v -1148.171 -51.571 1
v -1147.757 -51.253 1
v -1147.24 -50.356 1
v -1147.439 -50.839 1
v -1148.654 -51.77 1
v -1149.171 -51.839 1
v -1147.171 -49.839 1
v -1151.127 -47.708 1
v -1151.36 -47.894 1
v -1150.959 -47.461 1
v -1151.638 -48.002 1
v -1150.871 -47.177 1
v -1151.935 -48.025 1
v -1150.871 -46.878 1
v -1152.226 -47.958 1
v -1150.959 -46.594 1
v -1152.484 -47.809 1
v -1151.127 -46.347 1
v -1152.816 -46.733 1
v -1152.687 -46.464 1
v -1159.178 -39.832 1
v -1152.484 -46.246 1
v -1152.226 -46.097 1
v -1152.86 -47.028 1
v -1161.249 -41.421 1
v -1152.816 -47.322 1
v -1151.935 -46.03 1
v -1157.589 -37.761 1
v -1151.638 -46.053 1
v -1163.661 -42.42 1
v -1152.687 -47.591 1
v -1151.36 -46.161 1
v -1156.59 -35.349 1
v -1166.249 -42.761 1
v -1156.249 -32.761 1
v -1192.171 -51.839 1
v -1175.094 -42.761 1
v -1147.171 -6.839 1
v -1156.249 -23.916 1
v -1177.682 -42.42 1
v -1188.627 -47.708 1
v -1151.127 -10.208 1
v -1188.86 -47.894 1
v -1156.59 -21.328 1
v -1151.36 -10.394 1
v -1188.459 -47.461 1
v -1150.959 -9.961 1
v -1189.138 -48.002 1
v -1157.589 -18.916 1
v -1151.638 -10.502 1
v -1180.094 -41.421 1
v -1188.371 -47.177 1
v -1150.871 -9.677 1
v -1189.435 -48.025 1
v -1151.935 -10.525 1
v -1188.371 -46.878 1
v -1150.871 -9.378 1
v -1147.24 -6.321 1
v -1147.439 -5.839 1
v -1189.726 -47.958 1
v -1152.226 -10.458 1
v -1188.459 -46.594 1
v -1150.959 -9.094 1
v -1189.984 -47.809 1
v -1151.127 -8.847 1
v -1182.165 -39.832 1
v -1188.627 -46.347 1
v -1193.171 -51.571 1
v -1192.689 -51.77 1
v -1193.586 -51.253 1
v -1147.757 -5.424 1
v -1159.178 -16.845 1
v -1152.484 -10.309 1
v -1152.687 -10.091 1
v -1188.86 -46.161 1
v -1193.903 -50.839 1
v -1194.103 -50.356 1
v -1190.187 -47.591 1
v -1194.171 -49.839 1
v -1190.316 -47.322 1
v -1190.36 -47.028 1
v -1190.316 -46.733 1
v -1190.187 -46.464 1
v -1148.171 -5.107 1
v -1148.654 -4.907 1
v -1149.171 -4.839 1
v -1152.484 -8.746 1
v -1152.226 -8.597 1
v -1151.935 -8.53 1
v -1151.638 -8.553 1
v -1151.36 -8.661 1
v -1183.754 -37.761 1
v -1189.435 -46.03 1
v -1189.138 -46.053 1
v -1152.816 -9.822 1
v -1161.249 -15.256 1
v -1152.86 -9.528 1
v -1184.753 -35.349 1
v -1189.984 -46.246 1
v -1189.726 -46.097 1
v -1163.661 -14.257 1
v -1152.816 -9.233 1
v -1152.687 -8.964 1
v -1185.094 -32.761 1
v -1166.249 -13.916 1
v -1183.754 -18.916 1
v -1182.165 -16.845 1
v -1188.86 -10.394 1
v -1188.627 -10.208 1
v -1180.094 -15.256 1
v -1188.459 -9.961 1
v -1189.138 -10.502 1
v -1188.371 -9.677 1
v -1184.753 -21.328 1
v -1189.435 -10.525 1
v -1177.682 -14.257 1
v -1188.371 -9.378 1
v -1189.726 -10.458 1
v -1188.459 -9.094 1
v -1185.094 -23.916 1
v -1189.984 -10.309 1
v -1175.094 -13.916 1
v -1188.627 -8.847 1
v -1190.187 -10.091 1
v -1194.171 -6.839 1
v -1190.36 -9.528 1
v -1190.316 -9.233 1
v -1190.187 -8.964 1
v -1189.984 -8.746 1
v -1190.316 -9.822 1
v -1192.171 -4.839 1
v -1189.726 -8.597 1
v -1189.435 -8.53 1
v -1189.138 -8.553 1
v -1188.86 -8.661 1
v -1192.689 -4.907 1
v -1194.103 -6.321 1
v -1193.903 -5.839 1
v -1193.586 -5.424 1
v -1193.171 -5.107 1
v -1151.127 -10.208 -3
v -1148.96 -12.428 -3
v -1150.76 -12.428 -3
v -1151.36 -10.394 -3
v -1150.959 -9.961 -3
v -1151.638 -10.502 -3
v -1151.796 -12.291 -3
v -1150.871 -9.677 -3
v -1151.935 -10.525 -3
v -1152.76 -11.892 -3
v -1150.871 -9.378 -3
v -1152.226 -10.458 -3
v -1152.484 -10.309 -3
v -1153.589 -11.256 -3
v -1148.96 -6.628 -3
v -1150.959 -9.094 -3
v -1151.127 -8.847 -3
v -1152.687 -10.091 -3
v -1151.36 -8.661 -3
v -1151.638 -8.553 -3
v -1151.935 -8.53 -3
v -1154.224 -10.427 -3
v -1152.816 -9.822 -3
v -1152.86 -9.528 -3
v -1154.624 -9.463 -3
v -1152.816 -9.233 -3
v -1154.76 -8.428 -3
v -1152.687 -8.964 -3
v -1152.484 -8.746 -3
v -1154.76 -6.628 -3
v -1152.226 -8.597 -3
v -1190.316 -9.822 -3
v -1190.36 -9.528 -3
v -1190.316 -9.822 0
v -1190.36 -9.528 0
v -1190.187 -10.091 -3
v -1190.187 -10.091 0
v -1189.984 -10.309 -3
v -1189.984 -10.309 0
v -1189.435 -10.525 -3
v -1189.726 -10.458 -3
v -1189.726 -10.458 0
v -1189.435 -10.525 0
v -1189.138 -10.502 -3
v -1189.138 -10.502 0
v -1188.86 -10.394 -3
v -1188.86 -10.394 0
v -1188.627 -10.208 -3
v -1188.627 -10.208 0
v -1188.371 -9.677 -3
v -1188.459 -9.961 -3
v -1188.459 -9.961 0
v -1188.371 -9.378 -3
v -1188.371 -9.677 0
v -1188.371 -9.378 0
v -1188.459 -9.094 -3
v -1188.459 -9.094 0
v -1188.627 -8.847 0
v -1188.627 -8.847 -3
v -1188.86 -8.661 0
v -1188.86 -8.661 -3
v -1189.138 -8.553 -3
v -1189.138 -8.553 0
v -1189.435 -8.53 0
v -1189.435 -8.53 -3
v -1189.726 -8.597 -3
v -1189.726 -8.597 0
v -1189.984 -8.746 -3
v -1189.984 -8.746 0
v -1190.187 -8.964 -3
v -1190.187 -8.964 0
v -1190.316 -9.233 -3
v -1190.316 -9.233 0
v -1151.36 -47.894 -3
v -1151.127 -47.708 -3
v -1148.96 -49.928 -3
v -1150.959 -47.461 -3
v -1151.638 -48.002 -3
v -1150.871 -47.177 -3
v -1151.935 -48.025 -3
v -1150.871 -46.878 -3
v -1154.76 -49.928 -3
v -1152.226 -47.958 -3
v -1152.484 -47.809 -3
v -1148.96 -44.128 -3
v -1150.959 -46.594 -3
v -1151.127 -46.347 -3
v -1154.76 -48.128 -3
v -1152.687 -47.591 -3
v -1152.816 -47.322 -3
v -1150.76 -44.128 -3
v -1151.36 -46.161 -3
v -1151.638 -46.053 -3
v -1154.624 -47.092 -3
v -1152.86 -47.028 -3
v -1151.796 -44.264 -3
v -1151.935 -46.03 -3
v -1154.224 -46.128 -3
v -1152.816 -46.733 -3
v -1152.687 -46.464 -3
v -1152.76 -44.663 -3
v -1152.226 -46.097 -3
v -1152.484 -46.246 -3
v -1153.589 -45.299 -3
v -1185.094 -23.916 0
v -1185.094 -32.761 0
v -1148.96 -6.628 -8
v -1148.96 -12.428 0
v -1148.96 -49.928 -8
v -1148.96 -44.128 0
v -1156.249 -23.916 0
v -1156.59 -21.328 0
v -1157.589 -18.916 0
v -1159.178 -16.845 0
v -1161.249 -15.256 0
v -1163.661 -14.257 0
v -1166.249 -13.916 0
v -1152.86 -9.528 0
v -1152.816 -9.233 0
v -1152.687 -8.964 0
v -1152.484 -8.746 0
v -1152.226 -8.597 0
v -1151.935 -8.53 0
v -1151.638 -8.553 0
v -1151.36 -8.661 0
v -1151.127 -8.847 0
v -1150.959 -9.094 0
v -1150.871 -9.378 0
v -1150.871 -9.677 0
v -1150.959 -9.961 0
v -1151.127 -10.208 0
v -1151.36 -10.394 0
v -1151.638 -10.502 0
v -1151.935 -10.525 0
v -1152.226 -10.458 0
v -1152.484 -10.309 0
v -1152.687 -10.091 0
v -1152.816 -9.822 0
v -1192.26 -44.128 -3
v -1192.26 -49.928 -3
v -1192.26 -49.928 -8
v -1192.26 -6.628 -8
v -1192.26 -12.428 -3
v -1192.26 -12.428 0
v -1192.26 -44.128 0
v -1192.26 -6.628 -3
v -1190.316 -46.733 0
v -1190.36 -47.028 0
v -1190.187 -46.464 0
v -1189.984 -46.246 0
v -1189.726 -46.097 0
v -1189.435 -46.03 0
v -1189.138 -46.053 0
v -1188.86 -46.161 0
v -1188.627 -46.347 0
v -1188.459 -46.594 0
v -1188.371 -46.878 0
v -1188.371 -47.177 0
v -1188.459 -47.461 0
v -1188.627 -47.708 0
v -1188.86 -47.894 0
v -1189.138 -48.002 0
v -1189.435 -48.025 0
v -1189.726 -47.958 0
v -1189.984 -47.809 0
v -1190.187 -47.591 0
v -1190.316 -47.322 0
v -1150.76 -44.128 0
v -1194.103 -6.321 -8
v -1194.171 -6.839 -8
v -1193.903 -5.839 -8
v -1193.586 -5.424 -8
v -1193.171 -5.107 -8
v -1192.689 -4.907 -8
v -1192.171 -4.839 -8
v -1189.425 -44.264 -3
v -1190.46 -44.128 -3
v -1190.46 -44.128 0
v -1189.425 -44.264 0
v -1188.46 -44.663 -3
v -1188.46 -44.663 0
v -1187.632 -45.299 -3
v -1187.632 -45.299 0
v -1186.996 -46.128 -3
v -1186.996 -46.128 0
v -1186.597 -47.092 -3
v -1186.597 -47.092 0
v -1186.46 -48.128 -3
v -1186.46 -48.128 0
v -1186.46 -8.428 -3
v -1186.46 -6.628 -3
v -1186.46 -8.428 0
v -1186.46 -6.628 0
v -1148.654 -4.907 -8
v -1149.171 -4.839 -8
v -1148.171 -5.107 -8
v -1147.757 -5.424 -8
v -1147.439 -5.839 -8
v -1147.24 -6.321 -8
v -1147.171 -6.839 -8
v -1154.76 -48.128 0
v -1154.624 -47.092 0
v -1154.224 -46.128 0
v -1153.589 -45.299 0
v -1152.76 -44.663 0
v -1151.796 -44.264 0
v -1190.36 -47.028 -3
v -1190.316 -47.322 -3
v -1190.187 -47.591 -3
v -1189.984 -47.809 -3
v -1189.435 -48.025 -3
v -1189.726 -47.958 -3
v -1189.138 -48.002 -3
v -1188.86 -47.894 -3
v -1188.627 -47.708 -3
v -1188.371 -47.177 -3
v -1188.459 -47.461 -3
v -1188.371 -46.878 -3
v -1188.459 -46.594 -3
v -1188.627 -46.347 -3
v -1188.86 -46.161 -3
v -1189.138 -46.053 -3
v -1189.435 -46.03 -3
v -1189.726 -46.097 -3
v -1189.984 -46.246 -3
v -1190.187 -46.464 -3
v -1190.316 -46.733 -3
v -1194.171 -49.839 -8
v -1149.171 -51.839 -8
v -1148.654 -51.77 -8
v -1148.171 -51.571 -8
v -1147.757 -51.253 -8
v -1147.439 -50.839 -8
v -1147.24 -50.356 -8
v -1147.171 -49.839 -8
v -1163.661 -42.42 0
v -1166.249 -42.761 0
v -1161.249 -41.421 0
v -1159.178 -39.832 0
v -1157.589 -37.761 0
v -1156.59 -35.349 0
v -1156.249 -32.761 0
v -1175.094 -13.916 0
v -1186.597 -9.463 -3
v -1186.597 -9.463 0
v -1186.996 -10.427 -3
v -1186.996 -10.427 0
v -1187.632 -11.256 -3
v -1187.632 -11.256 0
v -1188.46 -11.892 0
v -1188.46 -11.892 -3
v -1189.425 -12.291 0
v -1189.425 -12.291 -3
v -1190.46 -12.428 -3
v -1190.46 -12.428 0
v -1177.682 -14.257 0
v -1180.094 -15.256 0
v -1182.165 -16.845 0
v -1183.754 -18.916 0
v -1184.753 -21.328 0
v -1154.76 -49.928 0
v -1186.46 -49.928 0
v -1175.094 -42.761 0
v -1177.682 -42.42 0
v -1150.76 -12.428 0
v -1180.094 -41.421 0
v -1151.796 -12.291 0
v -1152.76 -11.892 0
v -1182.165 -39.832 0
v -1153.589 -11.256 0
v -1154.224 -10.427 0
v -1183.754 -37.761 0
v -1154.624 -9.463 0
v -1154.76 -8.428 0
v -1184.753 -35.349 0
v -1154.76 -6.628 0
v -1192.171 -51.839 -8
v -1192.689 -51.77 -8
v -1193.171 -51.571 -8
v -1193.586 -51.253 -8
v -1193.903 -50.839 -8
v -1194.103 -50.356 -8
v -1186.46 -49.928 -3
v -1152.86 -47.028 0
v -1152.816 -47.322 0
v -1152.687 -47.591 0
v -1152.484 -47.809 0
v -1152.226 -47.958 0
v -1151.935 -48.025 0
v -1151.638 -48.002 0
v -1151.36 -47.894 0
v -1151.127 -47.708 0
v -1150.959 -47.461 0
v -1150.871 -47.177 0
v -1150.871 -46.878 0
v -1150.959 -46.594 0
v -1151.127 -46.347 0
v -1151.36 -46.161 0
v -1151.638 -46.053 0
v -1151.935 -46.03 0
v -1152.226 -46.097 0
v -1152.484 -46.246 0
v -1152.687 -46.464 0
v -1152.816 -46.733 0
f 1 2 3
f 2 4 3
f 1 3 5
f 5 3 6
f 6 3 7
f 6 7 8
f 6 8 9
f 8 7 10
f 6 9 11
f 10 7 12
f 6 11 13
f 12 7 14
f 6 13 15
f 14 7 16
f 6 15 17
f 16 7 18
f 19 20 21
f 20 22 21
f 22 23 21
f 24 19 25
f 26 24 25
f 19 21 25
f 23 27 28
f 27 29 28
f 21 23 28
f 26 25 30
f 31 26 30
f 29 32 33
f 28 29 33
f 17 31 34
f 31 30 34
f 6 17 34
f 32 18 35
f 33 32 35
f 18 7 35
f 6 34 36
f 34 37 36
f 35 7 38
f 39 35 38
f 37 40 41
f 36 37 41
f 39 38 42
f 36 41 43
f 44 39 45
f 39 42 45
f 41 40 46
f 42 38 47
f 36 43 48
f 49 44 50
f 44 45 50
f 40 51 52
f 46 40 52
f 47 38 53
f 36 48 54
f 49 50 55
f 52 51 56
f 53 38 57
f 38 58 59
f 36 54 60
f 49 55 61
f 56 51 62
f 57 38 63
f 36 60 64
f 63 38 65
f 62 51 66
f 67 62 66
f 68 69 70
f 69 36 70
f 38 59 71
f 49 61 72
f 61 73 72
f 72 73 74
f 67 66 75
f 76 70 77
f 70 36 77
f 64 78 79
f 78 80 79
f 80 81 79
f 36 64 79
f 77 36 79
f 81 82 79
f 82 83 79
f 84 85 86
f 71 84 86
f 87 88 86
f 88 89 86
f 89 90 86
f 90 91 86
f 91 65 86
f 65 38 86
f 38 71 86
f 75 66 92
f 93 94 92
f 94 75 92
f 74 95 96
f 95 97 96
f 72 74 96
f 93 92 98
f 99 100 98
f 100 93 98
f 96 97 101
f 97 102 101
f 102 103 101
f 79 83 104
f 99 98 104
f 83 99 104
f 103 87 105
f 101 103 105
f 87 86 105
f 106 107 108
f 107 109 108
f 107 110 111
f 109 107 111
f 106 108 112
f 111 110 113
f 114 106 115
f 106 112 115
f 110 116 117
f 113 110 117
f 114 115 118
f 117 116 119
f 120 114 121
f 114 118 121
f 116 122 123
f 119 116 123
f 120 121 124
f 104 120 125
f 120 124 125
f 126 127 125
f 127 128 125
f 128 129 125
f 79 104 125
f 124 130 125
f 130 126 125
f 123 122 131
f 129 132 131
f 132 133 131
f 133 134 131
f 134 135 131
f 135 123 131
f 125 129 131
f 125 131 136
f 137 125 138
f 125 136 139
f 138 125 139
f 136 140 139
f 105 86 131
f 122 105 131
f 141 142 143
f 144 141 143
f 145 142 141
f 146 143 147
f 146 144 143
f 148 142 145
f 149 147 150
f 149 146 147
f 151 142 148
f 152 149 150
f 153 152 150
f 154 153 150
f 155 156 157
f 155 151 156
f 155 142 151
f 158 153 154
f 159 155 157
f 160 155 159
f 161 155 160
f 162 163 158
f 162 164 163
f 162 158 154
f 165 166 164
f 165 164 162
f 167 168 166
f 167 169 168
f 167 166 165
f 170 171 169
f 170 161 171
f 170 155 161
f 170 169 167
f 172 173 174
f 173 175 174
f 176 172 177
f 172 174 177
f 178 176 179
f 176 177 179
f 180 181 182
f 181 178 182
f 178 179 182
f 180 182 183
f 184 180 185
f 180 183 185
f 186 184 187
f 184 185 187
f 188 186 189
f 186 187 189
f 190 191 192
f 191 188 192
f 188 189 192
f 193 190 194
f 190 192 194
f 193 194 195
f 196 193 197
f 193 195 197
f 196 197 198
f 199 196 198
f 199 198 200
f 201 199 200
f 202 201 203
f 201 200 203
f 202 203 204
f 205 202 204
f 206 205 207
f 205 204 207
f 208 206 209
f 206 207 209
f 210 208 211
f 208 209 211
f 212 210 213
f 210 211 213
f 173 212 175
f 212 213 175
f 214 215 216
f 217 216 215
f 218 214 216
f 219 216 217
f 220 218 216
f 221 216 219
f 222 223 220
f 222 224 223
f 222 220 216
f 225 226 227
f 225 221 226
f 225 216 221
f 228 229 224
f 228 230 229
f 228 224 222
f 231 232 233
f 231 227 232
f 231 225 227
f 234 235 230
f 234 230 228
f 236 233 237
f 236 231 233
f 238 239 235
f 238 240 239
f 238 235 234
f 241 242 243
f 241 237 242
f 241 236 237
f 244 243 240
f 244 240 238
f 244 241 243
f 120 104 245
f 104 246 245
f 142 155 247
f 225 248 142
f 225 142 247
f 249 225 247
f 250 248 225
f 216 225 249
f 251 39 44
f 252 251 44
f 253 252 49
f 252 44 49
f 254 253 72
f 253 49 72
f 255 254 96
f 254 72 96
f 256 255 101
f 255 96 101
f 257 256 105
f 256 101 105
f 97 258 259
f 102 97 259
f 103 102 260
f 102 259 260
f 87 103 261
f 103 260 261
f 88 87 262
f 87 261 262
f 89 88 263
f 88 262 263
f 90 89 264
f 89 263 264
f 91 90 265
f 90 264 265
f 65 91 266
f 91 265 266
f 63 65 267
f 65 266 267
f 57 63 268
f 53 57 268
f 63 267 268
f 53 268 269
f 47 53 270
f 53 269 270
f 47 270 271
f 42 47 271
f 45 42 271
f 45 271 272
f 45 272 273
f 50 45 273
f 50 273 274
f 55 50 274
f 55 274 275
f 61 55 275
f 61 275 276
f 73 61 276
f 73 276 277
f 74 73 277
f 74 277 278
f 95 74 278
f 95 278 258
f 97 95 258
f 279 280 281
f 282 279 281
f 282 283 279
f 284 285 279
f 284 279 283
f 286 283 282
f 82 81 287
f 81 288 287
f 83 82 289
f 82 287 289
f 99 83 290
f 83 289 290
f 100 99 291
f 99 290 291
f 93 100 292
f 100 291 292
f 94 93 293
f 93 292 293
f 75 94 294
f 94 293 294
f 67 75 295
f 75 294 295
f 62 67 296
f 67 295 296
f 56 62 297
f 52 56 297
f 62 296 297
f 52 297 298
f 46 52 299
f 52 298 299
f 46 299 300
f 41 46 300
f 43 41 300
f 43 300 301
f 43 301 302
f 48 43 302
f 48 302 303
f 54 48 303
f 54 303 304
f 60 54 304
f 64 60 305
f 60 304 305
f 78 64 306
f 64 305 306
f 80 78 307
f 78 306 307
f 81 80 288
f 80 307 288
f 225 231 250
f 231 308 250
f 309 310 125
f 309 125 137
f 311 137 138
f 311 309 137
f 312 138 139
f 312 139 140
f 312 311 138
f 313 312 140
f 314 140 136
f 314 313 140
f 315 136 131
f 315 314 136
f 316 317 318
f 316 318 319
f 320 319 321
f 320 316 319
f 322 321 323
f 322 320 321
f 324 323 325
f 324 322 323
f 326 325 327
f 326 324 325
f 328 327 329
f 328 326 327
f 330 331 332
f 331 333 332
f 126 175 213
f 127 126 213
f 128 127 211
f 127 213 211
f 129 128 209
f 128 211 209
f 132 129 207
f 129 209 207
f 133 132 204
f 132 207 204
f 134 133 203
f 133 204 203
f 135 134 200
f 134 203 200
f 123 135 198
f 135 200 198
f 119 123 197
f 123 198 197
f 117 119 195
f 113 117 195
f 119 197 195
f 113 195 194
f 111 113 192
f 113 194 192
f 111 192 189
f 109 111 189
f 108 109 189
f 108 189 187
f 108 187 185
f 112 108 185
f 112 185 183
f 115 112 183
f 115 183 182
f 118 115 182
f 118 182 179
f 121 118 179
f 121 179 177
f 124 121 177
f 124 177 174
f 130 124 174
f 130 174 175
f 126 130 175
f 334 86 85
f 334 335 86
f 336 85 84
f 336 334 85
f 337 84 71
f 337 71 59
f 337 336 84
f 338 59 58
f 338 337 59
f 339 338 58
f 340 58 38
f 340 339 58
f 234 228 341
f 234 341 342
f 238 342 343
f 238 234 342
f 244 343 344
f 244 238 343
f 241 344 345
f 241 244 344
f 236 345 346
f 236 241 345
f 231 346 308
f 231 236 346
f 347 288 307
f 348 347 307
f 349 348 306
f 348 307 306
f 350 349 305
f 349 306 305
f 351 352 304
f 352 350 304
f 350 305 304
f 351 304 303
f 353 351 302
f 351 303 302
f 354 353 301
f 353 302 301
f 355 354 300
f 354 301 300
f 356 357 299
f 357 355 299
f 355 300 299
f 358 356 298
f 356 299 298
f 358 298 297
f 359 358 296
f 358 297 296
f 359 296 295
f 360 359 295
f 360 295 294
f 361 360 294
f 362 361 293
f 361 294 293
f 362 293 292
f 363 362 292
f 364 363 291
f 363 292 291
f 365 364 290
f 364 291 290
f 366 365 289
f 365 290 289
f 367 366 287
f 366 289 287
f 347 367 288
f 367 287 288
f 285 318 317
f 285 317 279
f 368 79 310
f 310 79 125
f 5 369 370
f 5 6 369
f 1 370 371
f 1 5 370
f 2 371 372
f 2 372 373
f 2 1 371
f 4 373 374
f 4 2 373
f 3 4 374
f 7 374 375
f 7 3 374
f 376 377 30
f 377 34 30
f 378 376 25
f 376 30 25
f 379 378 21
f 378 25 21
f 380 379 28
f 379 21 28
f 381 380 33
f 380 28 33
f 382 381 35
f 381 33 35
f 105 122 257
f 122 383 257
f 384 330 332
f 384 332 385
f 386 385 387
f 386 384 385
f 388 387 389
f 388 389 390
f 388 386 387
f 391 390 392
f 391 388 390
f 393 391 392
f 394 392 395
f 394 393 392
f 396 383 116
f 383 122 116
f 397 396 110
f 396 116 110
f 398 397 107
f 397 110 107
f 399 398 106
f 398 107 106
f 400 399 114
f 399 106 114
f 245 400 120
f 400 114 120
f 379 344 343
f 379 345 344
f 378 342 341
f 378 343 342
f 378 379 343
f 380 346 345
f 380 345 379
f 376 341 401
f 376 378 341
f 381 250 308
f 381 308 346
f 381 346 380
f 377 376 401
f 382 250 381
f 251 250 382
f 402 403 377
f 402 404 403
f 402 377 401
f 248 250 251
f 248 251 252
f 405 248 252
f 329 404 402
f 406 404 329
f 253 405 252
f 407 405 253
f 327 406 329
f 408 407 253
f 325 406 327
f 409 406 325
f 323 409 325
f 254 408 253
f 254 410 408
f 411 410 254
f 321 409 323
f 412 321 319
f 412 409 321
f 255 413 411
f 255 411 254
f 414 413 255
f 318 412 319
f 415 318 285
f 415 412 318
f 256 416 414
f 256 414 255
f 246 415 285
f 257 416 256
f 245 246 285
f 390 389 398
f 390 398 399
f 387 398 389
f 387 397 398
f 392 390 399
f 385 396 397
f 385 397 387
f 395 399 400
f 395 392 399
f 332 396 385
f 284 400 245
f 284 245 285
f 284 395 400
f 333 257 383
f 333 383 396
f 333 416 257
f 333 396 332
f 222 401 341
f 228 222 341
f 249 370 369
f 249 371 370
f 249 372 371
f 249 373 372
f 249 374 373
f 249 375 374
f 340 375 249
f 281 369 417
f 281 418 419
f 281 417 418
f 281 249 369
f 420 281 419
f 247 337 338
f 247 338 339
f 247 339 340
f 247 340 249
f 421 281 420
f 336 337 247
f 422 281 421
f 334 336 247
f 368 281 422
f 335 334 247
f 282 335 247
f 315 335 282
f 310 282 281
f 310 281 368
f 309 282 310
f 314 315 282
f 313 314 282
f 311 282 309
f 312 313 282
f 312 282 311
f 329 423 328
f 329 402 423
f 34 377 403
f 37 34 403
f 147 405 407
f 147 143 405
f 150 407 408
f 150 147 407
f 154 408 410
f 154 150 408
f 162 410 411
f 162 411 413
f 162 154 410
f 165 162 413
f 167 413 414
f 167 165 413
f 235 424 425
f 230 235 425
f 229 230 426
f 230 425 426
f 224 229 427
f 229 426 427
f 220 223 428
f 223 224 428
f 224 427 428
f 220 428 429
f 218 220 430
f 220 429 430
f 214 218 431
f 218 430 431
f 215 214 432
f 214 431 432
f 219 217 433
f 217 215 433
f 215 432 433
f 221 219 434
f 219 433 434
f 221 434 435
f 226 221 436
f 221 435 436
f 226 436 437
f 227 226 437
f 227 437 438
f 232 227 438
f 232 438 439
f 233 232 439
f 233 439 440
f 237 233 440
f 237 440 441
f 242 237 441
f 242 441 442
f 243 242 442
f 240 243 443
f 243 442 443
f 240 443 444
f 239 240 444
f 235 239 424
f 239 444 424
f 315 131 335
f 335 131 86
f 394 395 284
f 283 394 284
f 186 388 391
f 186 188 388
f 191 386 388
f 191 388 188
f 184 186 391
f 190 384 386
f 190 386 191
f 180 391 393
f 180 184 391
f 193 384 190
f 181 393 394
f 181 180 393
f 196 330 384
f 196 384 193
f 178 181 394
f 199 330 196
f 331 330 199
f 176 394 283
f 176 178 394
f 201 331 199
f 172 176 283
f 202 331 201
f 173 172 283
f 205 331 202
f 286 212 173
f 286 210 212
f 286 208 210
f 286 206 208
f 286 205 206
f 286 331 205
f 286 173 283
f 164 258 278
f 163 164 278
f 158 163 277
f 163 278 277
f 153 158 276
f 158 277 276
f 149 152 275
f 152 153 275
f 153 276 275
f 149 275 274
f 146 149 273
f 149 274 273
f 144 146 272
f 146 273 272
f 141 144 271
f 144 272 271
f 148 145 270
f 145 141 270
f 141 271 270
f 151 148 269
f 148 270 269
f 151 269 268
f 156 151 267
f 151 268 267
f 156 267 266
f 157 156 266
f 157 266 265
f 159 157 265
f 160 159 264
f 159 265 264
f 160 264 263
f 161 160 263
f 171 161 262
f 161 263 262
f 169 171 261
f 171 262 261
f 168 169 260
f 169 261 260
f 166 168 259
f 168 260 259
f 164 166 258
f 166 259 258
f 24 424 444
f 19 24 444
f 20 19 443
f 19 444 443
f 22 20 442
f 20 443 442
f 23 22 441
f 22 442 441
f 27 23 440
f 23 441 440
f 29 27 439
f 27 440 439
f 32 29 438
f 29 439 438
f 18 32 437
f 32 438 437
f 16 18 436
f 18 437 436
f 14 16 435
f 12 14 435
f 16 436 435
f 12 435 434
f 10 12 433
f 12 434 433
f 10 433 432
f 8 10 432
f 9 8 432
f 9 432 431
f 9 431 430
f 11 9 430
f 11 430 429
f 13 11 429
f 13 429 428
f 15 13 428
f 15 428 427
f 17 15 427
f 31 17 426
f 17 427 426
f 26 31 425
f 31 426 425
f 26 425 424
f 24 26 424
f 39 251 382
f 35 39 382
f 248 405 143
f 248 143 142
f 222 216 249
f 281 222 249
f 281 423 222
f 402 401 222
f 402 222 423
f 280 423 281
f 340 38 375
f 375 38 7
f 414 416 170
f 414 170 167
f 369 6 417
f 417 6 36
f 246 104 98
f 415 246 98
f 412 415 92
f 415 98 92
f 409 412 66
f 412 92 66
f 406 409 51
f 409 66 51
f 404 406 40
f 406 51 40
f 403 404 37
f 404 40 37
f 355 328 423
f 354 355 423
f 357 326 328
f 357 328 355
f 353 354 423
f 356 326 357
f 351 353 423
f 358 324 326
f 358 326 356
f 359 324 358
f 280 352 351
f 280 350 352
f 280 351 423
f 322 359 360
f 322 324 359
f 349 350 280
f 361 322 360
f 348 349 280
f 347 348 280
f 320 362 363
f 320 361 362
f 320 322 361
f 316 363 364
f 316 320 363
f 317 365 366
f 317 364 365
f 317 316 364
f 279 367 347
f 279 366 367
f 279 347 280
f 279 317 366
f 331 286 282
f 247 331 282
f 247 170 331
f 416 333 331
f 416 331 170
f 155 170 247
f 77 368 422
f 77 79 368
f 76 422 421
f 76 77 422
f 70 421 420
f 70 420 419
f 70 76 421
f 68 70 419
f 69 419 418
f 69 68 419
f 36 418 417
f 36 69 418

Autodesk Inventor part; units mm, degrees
ref_plane "YZ Plane" through (0, 0, 0) normal (1, 0, 0) x (0, 1, 0)
ref_plane "XZ Plane" through (0, 0, 0) normal (0, 1, 0) x (-1, 0, 0)
ref_plane "XY Plane" through (0, 0, 0) normal (0, 0, 1) x (1, 0, 0)
ref_plane "Work Plane3" through (-1117.6, -50.8, 0) normal (0, 0, -1) x (-1, 0, 0)
sketch "Sketch1" plane through (-1117.6, -50.8, 0) normal (0, 0, -1) x (-1, 0, 0)
  line L0 (76.5714, 45.9614) -> (29.5714, 45.9614)
  line L1 (29.5714, 45.9614) -> (29.5714, -1.0386)
  line L2 (29.5714, -1.0386) -> (76.5714, -1.0386)
  line L3 (76.5714, -1.0386) -> (76.5714, 45.9614)
  circle A0 centre (71.7603, 41.2725) radius 1
  line L4 (74.6603, 44.1725) -> (31.3603, 44.1725)
  line L5 (31.3603, 44.1725) -> (31.3603, 0.8725)
  line L6 (31.3603, 0.8725) -> (74.6603, 0.8725)
  line L7 (74.6603, 0.8725) -> (74.6603, 44.1725)
  circle A1 centre (34.2603, 41.2725) radius 1
  circle A2 centre (34.2603, 3.7725) radius 1
  circle A3 centre (71.7603, 3.7725) radius 1
  line L8 (38.6492, 8.0392) -> (67.4936, 8.0392)
  line L9 (67.4936, 8.0392) -> (67.4936, 36.8837)
  line L10 (67.4936, 36.8837) -> (38.6492, 36.8837)
  line L11 (38.6492, 36.8837) -> (38.6492, 8.0392)
  line L12 (74.6603, 0.8725) -> (68.8603, 0.8725)
  line L13 (68.8603, 0.8725) -> (68.8603, 6.6725)
  line L14 (68.8603, 6.6725) -> (74.6603, 6.6725)
  line L15 (74.6603, 6.6725) -> (74.6603, 0.8725)
  line L16 (31.3603, 0.8725) -> (37.1603, 0.8725)
  line L17 (37.1603, 0.8725) -> (37.1603, 6.6725)
  line L18 (37.1603, 6.6725) -> (31.3603, 6.6725)
  line L19 (31.3603, 6.6725) -> (31.3603, 0.8725)
  line L20 (31.3603, 44.1725) -> (37.1603, 44.1725)
  line L21 (37.1603, 44.1725) -> (37.1603, 38.3725)
  line L22 (37.1603, 38.3725) -> (31.3603, 38.3725)
  line L23 (31.3603, 38.3725) -> (31.3603, 44.1725)
  line L24 (74.6603, 44.1725) -> (68.8603, 44.1725)
  line L25 (68.8603, 44.1725) -> (68.8603, 38.3725)
  line L26 (68.8603, 38.3725) -> (74.6603, 38.3725)
  line L27 (74.6603, 38.3725) -> (74.6603, 44.1725)
  point P0 (-1117.6, 50.8)
  point P1 (53.0714, 45.9614)
  point P2 (53.0714, -1.0386)
  point P3 (31.3603, 3.7725)
  point P4 (34.2603, 44.1725)
  point P5 (31.3603, 6.6725)
  point P6 (37.1603, 0.8725)
  point P7 (74.6603, 6.6725)
  point P8 (68.8603, 0.8725)
  point P9 (74.6603, 38.3725)
  point P10 (68.8603, 44.1725)
  point P11 (31.3603, 38.3725)
  point P12 (37.1603, 44.1725)
  dimension "d1" = 47
  dimension "d2" = 47
  dimension "d4" = 2
  dimension "d6" = 1.9111
  dimension "d7" = 1.9111
  dimension "d8" = 43.3
  dimension "d9" = 43.3
  dimension "d10" = 2
  dimension "d14" = 2
  dimension "d17" = 2
  dimension "d24" = 9.0778
  dimension "d25" = 9.0778
  dimension "d26" = 9.0778
  dimension "d27" = 9.0778
  dimension "d61" = 5.8
  dimension "d62" = 5.8
  dimension "d63" = 5.8
  dimension "d64" = 5.8
  dimension "d65" = 5.8
  dimension "d66" = 5.8
  dimension "d67" = 5.8
  dimension "d68" = 5.8
  dimension "d69" = 37.5
  dimension "d70" = 37.5
  dimension "d71" = 37.5
  dimension "d72" = 37.5
  dimension "d73" = 2.9
  dimension "d74" = 2.9
extrude "Extrusion3" add sketch "Sketch1" along normal blind 8 contours L3 L2 L1 L0
extrude "Extrusion7" add sketch "Sketch1" along normal blind 3 contours L7 L26 L25 L4 | L21 L22 L5 L4 | L7 L6 L13 L14 | L18 L17 L6 L5
extrude "Extrusion8" add sketch "Sketch1" against normal blind 1 contours L3 L2 L1 L0 | A0 | L7 L26 L25 L4 | L25 L26 L7 L14 L13 L6 L17 L18 L5 L22 L21 L4 | L21 L22 L5 L4 | L7 L6 L13 L14 | L18 L17 L6 L5 | A1 | A2 | A3
extrude "Extrusion6" cut sketch "Sketch1" along normal mid plane 10 contours A0 | A1 | A2 | A3
fillet "Fillet5" radius 10 4 edges at (-1156.2492, -13.9163, 0.5) (-1185.0936, -13.9163, 0.5) (-1185.0936, -42.7608, 0.5) (-1156.2492, -42.7608, 0.5)
fillet "Fillet6" radius 2 4 edges at (-1194.1714, -4.8386, -3.5) (-1147.1714, -4.8386, -3.5) (-1194.1714, -51.8386, -3.5) (-1147.1714, -51.8386, -3.5)
fillet "Fillet7" radius 4 4 edges at (-1154.7603, -12.4275, -1.5) (-1186.4603, -12.4275, -1.5) (-1186.4603, -44.1275, -1.5) (-1154.7603, -44.1275, -1.5)
equation "\"d10\" = d4"
equation "\"d14\" = d4"
equation "\"d17\" = d4"
equation "\"d61\" = 2 * d73"
equation "\"d73\" = -0.5 * d72 + 0.5 * d8"
properties part number "bracket"
